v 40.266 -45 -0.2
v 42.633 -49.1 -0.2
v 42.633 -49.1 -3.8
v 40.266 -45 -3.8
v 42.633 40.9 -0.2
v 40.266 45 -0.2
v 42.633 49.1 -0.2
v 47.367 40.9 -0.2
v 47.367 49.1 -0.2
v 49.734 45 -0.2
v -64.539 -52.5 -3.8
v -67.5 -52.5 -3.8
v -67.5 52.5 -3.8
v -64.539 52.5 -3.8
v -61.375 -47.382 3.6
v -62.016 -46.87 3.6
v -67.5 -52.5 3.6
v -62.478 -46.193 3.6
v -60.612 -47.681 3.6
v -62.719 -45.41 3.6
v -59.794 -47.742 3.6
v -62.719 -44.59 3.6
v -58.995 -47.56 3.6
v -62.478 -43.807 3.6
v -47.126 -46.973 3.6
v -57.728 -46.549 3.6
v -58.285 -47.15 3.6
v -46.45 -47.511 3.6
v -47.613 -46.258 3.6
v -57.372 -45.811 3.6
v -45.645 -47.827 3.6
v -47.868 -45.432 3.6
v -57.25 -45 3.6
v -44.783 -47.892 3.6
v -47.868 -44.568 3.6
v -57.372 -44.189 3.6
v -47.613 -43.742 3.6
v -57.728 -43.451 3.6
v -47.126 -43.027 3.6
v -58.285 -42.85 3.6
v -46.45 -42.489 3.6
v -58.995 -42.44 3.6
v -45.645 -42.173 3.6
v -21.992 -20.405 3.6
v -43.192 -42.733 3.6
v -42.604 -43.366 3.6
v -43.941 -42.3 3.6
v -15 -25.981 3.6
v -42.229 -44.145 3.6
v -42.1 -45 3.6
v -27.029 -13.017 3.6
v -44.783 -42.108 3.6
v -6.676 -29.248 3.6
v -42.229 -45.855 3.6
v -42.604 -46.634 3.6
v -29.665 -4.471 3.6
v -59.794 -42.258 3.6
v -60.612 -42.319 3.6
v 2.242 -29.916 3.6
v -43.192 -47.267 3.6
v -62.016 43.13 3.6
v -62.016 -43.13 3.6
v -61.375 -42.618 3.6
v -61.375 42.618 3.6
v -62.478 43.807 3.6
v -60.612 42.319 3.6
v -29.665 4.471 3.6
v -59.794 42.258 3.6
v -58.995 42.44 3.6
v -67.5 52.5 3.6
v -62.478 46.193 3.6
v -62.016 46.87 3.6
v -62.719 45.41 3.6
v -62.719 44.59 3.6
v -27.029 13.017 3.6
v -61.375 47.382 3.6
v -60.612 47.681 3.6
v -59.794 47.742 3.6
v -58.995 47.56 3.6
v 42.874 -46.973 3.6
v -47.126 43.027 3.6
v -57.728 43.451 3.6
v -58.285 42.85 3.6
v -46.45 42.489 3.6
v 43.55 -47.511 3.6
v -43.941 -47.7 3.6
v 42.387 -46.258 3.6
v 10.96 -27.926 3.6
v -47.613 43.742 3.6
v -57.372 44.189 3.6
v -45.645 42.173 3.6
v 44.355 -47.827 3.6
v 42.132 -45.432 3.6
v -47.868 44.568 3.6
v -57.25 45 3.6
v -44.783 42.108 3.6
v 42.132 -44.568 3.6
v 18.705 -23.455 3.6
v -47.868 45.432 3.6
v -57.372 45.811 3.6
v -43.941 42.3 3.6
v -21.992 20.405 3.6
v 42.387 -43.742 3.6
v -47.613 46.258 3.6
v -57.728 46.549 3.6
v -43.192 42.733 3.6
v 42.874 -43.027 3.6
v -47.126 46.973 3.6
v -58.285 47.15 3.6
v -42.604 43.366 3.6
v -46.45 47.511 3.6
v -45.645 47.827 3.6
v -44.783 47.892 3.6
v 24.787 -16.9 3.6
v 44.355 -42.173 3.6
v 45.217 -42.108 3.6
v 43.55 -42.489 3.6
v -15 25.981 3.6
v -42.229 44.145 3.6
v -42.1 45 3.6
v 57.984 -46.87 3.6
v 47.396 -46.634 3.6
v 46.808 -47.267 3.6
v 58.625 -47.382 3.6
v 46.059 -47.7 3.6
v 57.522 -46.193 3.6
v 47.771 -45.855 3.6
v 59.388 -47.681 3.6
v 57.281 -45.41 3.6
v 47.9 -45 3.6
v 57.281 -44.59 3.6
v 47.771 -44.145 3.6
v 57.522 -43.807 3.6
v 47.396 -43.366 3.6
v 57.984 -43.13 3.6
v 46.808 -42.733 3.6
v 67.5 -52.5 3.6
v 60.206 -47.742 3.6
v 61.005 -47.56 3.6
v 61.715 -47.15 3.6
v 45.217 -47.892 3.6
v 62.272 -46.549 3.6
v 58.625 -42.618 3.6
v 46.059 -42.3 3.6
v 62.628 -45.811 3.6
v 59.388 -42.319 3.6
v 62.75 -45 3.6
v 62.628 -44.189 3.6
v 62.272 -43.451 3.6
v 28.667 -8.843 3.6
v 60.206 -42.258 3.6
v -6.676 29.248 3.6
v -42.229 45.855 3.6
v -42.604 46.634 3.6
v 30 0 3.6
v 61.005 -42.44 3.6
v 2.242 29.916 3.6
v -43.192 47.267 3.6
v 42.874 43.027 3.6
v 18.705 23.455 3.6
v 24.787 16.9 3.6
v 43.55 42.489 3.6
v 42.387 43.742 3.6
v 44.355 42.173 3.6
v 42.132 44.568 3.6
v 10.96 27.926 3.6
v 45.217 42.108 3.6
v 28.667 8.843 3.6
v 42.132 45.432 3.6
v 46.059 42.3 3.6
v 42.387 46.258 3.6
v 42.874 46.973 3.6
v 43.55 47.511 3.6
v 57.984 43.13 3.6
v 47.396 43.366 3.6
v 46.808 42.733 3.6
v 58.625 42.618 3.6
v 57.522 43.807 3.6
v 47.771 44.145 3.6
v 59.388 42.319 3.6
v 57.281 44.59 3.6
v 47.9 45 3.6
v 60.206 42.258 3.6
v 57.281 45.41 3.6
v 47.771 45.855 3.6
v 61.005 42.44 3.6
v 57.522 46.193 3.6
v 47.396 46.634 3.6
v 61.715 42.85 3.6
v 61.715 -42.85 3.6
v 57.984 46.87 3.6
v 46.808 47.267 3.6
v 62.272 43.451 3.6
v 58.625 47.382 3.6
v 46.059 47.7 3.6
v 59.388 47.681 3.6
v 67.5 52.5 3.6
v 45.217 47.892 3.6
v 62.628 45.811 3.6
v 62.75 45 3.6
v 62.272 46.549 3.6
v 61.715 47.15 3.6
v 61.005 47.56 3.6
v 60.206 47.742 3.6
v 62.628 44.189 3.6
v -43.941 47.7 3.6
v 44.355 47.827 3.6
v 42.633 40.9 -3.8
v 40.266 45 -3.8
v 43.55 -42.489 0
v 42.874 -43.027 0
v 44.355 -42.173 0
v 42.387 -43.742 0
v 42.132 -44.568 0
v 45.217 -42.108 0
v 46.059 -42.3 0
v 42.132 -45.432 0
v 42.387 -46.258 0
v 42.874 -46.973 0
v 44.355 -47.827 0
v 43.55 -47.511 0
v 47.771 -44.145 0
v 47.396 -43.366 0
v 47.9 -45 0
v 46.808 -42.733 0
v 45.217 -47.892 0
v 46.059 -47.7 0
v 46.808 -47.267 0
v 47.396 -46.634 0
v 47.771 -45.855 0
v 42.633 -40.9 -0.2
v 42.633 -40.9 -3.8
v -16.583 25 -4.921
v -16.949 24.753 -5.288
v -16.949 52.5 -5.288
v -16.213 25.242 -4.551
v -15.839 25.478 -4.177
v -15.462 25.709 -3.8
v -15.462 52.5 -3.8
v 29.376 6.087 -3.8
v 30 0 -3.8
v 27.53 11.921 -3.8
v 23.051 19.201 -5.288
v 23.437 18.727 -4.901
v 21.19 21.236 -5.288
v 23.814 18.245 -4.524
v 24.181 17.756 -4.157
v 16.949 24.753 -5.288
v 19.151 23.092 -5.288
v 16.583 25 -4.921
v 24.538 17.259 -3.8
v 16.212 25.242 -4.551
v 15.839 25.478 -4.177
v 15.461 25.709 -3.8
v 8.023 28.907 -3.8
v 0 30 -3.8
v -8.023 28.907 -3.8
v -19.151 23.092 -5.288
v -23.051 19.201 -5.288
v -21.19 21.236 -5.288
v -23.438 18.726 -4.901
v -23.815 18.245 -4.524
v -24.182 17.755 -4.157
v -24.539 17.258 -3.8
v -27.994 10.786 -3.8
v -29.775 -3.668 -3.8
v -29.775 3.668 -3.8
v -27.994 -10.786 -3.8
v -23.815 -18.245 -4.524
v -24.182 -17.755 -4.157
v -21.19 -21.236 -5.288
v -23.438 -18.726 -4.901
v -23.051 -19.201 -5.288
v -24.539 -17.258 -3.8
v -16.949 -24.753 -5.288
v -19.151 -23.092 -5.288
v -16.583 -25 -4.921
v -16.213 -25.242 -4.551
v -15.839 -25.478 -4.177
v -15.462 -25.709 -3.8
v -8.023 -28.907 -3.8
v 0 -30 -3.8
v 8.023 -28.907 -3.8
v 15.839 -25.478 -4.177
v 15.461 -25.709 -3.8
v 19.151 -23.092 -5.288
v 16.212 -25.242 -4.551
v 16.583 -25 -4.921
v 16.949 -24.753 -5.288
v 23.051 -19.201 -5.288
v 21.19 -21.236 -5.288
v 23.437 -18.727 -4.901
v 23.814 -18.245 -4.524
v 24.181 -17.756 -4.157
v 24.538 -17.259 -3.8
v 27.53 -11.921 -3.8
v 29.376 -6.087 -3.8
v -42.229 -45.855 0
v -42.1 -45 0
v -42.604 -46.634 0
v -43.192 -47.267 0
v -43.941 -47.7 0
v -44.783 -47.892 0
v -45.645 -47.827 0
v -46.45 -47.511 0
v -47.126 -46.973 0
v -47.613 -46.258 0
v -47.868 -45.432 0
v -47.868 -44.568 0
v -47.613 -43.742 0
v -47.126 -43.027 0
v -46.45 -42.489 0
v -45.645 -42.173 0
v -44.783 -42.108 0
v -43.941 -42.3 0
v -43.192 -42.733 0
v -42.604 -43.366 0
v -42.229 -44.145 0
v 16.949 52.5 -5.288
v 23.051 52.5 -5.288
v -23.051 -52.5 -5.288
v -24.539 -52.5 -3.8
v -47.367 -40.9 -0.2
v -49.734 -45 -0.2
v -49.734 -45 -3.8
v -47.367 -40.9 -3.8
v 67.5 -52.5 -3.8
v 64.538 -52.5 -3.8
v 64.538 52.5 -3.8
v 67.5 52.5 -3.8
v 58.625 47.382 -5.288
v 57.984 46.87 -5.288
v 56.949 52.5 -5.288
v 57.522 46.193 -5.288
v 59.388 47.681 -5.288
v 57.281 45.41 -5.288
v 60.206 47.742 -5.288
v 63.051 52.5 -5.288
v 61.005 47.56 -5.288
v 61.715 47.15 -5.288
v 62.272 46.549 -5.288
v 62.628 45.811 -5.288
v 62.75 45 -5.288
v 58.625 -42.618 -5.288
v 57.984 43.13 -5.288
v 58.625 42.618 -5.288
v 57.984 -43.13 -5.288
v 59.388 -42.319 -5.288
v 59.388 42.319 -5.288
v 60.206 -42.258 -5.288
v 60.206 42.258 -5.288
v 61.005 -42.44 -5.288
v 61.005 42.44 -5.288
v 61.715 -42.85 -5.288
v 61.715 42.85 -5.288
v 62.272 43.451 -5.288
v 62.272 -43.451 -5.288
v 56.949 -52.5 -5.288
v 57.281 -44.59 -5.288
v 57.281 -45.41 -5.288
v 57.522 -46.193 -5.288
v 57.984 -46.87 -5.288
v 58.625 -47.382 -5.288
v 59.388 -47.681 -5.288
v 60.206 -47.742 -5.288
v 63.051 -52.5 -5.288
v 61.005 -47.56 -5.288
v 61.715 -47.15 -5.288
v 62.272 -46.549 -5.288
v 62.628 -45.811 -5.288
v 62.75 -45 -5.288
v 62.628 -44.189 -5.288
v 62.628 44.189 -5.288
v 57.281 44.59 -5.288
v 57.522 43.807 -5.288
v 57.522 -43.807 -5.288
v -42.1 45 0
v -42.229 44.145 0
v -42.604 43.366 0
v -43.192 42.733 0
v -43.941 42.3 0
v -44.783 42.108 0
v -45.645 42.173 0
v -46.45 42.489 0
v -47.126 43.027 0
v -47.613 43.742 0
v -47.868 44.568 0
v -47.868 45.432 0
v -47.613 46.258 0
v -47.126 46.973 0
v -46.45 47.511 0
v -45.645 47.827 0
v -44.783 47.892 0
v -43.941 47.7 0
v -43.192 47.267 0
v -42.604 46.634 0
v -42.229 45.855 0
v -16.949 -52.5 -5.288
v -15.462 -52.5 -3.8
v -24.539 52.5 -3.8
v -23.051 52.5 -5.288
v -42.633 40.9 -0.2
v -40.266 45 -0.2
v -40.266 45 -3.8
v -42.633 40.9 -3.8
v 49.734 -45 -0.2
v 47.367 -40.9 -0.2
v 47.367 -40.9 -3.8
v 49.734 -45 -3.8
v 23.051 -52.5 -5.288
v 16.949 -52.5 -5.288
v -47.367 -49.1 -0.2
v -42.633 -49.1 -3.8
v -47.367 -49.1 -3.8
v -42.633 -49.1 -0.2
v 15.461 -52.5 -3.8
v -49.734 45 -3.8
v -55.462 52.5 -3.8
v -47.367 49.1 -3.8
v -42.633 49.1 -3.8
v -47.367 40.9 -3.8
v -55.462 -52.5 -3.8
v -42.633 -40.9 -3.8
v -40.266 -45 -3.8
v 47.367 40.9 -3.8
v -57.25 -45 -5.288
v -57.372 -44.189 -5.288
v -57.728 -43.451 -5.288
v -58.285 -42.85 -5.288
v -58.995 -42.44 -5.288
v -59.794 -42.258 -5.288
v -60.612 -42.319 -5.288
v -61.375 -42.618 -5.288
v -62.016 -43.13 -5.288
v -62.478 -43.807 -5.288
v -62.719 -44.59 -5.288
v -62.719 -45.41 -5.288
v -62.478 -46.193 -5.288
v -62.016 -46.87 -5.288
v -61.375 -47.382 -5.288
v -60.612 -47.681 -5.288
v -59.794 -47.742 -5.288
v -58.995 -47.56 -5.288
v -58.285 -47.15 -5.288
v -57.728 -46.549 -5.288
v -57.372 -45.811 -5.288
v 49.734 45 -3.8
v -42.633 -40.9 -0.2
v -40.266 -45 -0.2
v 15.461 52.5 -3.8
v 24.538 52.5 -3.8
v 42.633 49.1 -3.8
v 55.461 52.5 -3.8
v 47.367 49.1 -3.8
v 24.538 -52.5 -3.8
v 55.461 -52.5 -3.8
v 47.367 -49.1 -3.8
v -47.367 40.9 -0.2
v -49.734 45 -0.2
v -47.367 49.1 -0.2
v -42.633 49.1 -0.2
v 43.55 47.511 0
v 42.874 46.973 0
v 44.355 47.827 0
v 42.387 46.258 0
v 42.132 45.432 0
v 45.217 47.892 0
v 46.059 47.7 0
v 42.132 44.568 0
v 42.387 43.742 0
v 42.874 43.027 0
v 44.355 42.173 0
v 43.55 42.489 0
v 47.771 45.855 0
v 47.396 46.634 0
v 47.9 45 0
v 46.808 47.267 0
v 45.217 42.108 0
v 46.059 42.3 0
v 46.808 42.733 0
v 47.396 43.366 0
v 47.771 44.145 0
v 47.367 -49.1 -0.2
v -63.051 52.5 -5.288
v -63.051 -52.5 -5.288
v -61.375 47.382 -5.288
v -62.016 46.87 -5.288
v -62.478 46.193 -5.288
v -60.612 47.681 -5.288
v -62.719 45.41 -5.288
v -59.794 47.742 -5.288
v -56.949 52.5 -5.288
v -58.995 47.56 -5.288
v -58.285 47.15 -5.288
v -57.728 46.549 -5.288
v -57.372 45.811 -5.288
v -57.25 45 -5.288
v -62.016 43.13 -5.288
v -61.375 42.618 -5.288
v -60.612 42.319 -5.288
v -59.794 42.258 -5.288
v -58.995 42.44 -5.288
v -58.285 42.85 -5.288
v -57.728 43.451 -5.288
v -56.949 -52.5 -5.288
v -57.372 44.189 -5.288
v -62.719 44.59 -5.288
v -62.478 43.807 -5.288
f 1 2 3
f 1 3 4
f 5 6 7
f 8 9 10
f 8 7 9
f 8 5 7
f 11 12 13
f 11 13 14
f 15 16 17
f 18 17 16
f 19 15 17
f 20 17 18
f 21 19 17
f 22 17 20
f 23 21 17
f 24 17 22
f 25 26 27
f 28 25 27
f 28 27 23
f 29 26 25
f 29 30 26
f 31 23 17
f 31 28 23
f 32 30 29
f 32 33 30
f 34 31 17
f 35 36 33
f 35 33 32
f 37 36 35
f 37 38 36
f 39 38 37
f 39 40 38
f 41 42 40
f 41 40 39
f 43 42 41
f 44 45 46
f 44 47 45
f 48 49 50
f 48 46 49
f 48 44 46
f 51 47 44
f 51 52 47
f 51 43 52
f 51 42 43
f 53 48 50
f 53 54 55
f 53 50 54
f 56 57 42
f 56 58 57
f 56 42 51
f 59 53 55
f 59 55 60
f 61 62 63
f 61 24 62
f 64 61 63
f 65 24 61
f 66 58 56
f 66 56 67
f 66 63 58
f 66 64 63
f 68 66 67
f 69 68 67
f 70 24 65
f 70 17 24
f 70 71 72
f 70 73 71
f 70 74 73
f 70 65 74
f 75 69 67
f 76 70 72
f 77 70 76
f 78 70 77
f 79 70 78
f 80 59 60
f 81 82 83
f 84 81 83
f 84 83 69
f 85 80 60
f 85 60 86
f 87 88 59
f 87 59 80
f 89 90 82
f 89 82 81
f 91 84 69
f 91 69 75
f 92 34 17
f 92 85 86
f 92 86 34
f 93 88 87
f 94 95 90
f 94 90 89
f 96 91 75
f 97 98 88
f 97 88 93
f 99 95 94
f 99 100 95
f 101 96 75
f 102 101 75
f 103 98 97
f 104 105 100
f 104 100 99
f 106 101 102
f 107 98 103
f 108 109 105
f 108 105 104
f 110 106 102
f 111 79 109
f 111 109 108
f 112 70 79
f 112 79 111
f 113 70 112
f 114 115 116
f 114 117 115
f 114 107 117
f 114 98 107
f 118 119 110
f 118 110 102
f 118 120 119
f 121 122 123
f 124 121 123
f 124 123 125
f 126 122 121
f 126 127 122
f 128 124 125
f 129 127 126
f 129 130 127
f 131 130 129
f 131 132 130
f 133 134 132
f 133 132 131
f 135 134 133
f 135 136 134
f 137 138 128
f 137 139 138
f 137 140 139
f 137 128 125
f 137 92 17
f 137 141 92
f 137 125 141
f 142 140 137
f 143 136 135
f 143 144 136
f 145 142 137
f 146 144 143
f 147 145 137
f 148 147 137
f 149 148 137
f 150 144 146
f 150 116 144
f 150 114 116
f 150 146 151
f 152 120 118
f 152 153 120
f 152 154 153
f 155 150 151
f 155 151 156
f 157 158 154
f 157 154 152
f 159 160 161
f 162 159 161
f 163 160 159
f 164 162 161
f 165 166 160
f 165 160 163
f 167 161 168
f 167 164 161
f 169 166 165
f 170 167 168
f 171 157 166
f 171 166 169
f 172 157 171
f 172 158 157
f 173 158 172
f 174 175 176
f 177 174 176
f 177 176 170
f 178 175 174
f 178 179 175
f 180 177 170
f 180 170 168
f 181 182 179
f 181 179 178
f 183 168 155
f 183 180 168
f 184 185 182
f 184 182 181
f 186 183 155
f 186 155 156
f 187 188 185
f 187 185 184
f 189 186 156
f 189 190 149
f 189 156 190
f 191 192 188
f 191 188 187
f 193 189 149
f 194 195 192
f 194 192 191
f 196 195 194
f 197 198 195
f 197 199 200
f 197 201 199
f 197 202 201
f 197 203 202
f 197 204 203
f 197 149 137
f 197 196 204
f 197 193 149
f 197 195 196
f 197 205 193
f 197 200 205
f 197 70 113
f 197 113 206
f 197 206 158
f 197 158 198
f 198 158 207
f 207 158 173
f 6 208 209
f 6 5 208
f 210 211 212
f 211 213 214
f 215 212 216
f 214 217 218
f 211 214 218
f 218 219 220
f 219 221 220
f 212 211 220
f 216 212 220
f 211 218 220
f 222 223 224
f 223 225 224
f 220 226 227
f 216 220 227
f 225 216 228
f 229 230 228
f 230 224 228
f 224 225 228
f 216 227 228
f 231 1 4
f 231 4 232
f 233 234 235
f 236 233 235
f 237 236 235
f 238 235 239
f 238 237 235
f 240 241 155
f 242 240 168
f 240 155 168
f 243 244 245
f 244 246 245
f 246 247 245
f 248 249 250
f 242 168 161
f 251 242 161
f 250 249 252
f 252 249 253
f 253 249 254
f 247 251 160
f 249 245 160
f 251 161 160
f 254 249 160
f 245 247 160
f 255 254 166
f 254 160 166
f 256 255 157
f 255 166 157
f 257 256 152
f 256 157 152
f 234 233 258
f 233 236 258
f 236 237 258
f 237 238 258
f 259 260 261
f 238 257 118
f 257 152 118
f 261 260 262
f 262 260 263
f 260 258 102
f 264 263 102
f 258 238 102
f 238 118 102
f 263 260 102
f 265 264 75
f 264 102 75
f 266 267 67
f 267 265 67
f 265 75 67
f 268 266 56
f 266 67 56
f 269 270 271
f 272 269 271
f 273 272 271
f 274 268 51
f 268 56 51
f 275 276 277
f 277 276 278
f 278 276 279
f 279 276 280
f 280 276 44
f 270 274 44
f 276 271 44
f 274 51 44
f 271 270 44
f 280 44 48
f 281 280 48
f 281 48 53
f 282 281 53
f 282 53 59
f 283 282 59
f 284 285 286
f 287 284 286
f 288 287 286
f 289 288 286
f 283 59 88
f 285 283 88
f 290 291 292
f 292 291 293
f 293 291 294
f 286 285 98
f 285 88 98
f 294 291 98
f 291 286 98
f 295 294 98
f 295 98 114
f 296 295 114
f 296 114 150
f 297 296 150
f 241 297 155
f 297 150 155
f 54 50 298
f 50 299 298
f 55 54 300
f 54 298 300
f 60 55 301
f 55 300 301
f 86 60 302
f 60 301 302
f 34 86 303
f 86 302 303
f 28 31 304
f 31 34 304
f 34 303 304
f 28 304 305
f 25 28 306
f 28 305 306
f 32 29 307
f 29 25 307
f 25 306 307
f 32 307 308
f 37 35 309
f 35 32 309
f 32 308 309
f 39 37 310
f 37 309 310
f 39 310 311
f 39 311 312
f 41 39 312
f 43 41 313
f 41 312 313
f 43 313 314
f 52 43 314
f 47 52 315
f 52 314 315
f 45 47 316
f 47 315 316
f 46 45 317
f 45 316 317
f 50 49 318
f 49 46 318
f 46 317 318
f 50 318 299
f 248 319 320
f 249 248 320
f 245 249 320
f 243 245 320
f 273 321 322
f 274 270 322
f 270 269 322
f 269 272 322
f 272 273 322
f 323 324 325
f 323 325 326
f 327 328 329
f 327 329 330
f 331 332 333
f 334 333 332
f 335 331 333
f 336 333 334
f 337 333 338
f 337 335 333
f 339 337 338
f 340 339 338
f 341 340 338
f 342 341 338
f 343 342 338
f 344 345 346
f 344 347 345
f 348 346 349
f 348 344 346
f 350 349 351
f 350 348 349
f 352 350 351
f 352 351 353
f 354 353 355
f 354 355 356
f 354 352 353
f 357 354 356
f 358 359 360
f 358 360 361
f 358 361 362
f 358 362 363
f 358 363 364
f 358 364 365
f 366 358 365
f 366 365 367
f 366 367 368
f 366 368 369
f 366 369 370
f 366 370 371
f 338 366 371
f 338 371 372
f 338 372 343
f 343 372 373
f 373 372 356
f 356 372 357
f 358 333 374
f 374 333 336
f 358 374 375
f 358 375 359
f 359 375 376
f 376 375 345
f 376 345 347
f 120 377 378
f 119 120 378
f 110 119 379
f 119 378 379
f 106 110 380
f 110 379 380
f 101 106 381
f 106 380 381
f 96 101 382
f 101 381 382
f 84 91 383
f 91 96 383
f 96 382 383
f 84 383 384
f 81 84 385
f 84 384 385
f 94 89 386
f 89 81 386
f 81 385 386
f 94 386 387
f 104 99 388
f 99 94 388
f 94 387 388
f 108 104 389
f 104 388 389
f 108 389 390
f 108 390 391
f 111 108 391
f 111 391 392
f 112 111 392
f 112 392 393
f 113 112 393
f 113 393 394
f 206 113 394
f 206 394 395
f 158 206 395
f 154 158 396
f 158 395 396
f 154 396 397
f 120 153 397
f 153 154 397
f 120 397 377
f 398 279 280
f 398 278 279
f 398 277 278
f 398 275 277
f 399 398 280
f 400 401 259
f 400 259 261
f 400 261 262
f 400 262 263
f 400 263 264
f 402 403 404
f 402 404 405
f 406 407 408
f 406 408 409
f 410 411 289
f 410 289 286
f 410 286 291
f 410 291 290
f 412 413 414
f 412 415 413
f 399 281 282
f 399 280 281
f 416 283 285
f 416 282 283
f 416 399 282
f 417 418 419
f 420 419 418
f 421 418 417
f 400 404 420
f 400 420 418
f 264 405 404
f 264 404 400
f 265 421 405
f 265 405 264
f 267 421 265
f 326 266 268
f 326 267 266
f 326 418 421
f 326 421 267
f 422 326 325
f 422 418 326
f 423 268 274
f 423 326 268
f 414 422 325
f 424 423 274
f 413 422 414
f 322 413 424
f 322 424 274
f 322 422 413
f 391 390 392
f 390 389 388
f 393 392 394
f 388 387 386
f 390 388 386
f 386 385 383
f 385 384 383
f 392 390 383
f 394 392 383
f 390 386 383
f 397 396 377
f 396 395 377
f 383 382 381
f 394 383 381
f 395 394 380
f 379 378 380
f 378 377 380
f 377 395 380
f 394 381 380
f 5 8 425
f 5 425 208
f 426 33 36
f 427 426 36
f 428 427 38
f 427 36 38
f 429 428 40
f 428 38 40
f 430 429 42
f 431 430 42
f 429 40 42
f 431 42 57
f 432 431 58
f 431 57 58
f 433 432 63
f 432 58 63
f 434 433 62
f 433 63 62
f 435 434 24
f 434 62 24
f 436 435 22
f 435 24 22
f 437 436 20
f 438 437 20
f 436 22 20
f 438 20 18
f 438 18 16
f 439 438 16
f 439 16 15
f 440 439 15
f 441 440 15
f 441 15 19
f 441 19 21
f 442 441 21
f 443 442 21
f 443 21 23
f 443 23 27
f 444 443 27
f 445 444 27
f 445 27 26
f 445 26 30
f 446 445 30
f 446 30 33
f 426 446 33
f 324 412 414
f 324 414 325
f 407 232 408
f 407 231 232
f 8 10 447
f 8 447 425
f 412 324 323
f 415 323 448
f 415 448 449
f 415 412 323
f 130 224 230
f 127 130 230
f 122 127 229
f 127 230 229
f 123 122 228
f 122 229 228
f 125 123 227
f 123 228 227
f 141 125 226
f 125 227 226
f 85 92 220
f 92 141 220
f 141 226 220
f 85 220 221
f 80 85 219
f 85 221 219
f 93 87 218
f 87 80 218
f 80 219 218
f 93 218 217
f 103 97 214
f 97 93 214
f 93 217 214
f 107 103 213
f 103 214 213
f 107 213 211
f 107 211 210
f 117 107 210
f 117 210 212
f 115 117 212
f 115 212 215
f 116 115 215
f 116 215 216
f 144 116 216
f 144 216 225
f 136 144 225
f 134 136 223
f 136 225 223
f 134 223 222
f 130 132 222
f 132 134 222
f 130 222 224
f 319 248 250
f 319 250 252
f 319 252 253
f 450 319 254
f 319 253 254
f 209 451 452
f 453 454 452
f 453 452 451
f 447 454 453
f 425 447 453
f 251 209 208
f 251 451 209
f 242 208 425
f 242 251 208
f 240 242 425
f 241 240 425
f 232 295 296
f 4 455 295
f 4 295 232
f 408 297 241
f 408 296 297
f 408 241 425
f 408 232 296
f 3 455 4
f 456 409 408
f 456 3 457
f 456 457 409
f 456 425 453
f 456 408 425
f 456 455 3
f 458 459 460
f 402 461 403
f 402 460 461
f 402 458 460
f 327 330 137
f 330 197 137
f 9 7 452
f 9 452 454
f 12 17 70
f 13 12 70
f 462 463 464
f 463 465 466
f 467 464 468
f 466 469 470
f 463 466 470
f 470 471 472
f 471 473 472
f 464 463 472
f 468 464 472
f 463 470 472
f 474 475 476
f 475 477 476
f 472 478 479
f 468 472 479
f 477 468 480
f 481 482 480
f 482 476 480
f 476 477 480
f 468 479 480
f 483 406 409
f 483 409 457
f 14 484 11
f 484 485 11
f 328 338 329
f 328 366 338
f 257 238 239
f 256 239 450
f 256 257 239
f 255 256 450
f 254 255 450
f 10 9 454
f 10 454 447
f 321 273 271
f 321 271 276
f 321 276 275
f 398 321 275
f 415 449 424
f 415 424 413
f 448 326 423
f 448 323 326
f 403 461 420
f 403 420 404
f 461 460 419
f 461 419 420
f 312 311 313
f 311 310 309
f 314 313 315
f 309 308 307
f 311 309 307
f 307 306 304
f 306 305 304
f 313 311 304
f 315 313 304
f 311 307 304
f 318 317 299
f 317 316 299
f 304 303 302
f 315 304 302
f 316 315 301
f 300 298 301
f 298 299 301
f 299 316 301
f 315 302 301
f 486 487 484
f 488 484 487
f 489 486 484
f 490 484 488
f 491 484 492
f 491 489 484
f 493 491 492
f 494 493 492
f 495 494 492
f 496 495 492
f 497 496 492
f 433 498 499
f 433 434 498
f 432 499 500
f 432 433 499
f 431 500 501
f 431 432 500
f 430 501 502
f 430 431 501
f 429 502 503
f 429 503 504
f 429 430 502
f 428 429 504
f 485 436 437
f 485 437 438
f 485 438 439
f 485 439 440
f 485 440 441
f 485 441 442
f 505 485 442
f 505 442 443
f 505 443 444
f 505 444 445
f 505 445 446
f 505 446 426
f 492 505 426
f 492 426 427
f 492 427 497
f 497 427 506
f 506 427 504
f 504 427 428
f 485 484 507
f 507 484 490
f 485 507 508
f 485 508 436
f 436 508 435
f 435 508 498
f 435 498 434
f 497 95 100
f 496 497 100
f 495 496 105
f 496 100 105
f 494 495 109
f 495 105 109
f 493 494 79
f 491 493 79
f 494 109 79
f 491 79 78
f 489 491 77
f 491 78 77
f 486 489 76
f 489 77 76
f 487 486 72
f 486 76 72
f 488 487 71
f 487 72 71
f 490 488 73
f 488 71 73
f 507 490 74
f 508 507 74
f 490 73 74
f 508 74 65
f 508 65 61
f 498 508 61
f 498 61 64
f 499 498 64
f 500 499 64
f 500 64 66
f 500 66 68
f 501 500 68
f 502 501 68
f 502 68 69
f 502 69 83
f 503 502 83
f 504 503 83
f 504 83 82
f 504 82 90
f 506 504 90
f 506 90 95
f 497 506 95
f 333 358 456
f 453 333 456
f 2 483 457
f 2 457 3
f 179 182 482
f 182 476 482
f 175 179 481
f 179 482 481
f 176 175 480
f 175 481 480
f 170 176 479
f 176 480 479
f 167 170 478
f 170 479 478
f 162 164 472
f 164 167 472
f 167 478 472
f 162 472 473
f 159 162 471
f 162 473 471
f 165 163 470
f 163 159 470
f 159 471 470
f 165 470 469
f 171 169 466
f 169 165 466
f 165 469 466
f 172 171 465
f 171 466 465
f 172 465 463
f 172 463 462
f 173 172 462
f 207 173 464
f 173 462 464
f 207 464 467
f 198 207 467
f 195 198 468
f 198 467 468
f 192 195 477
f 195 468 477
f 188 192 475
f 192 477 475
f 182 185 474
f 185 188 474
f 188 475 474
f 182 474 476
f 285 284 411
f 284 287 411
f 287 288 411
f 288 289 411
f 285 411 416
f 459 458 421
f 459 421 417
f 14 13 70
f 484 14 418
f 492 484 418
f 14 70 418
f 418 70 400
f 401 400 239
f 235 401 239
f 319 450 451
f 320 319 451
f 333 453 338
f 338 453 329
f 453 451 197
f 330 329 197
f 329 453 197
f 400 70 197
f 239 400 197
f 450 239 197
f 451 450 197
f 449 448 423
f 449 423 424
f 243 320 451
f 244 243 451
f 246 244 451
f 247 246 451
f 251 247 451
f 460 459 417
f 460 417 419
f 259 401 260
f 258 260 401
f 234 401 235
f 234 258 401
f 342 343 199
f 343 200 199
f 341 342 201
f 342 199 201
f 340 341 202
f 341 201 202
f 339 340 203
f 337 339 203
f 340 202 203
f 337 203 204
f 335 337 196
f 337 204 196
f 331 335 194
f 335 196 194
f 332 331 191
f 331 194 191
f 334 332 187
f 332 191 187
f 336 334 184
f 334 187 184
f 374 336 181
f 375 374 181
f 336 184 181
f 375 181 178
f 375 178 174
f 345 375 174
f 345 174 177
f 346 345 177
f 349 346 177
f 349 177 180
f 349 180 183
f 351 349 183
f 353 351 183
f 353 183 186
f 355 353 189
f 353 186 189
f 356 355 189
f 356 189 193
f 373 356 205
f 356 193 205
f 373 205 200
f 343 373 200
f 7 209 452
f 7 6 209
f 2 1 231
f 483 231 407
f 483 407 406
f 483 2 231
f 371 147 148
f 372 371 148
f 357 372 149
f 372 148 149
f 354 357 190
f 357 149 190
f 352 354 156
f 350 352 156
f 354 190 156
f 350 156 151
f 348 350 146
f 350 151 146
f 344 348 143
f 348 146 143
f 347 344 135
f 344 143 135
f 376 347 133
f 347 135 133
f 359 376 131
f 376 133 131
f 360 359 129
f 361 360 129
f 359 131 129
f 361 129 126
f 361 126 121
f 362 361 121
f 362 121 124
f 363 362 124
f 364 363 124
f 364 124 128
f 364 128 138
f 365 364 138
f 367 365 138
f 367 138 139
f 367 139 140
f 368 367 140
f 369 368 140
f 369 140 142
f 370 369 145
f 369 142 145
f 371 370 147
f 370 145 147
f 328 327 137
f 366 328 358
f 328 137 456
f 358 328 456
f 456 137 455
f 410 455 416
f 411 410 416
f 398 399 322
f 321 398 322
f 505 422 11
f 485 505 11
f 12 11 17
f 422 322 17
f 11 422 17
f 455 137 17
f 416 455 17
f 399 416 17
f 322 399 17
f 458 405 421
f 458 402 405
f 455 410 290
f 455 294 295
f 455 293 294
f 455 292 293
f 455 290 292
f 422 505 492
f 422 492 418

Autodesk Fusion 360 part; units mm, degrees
sketch "Sketch1" plane through (0, 0, 0) normal (0, 0, 1) x (1, 0, 0)
  line L0 (-45, 45) -> (45, 45) construction
  line L1 (45, 45) -> (45, -45) construction
  line L2 (45, -45) -> (-45, -45) construction
  line L3 (-45, -45) -> (-45, 45) construction
  line L4 (-45, 45) -> (45, -45) construction
  line L5 (45, 45) -> (-45, -45) construction
  circle A0 centre (-45, 45) radius 2.9
  circle A1 centre (45, 45) radius 2.9
  circle A2 centre (-45, -45) radius 2.9
  circle A3 centre (45, -45) radius 2.9
  line L6 (-60, 45) -> (60, 45) construction
  line L7 (60, 45) -> (60, -45) construction
  line L8 (60, -45) -> (-60, -45) construction
  line L9 (-60, -45) -> (-60, 45) construction
  line L10 (-60, 45) -> (60, -45) construction
  line L11 (60, 45) -> (-60, -45) construction
  circle A4 centre (-60, 45) radius 2.75
  circle A5 centre (60, 45) radius 2.75
  circle A6 centre (60, -45) radius 2.75
  circle A7 centre (-60, -45) radius 2.75
  line L12 (-67.5, 52.5) -> (67.5, 52.5)
  line L13 (67.5, 52.5) -> (67.5, -52.5)
  line L14 (67.5, -52.5) -> (-67.5, -52.5)
  line L15 (-67.5, -52.5) -> (-67.5, 52.5)
  line L16 (-67.5, 52.5) -> (67.5, -52.5) construction
  line L17 (67.5, 52.5) -> (-67.5, -52.5) construction
  circle A8 centre (0, 0) radius 30
  dimension "d1" = 90
  dimension "d2" = 90
  dimension "d3" = 5.8
  dimension "d4" = 5.8
  dimension "d5" = 5.8
  dimension "d6" = 5.8
  dimension "d7" = 120
  dimension "d8" = 90
  dimension "d9" = 5.5
  dimension "d10" = 5.5
  dimension "d11" = 5.5
  dimension "d12" = 5.5
  dimension "d13" = 135
  dimension "d14" = 105
  dimension "d27" = 60
extrude "Extrude1" add sketch "Sketch1" along normal blind 3.6
sketch "Sketch2" plane through (0, 0, 0) normal (0, 0, -1) x (1, 0, 0)
  circle A0 centre (-45, -45) radius 2.9
  circle A1 centre (-60, -45) radius 2.75
  circle A2 centre (60, -45) radius 2.75
  circle A3 centre (-60, 45) radius 2.75
  circle A4 centre (45, -45) radius 2.9
  circle A5 centre (-45, 45) radius 2.9
  circle A6 centre (45, 45) radius 2.9
  circle A7 centre (60, 45) radius 2.75
  line L0 (67.5, 52.5) -> (-67.5, 52.5)
  line L1 (-67.5, 52.5) -> (-67.5, -52.5)
  line L2 (-67.5, -52.5) -> (67.5, -52.5)
  line L3 (67.5, -52.5) -> (67.5, 52.5)
  line L4 (-67.5, 52.5) -> (67.5, 52.5)
  line L5 (67.5, 52.5) -> (67.5, -52.5)
  line L6 (67.5, -52.5) -> (-67.5, -52.5)
  line L7 (-67.5, -52.5) -> (-67.5, 52.5)
  line L8 (-67.5, 52.5) -> (67.5, -52.5) construction
  line L9 (67.5, 52.5) -> (-67.5, -52.5) construction
  circle A8 centre (0, 0) radius 30
  dimension "d17" = 135
  dimension "d18" = 105
extrude "Extrude2" add sketch "Sketch2" along normal blind 0.2 contours A0 | A4 | A5 | A6 | L0 L1 L2 L3 L4 L5 L6 L7
sketch "Sketch3" plane through (0, 0, -0.2) normal (0, 0, -1) x (1, 0, 0)
  circle A0 centre (-60, -45) radius 2.75
  circle A1 centre (60, -45) radius 2.75
  circle A2 centre (-60, 45) radius 2.75
  circle A3 centre (60, 45) radius 2.75
  line L0 (-67.5, -52.5) -> (67.5, -52.5)
  line L1 (67.5, -52.5) -> (67.5, 52.5)
  line L2 (67.5, 52.5) -> (-67.5, 52.5)
  line L3 (-67.5, 52.5) -> (-67.5, -52.5)
  line L4 (-42.6329, 40.9) -> (-40.2657, 45)
  line L5 (-40.2657, 45) -> (-42.6329, 49.1)
  line L6 (-42.6329, 49.1) -> (-47.3671, 49.1)
  line L7 (-47.3671, 49.1) -> (-49.7343, 45)
  line L8 (-49.7343, 45) -> (-47.3671, 40.9)
  line L9 (-47.3671, 40.9) -> (-42.6329, 40.9)
  line L10 (-47.3671, -40.9) -> (-49.7343, -45)
  line L11 (-49.7343, -45) -> (-47.3671, -49.1)
  line L12 (-47.3671, -49.1) -> (-42.6329, -49.1)
  line L13 (-42.6329, -49.1) -> (-40.2657, -45)
  line L14 (-40.2657, -45) -> (-42.6329, -40.9)
  line L15 (-42.6329, -40.9) -> (-47.3671, -40.9)
  line L16 (47.3671, 40.9) -> (49.7343, 45)
  line L17 (49.7343, 45) -> (47.3671, 49.1)
  line L18 (47.3671, 49.1) -> (42.6329, 49.1)
  line L19 (42.6329, 49.1) -> (40.2657, 45)
  line L20 (40.2657, 45) -> (42.6329, 40.9)
  line L21 (42.6329, 40.9) -> (47.3671, 40.9)
  line L22 (42.6329, -40.9) -> (40.2657, -45)
  line L23 (40.2657, -45) -> (42.6329, -49.1)
  line L24 (42.6329, -49.1) -> (47.3671, -49.1)
  line L25 (47.3671, -49.1) -> (49.7343, -45)
  line L26 (49.7343, -45) -> (47.3671, -40.9)
  line L27 (47.3671, -40.9) -> (42.6329, -40.9)
  circle A4 centre (0, 0) radius 30
  point P0 (-45, 45)
  point P1 (-45, -45)
  point P2 (45, 45)
  point P3 (45, -45)
  dimension "d21" = 4.1
  dimension "d22" = 4.1
  dimension "d23" = 4.1
  dimension "d24" = 4.1
extrude "Extrude3" add sketch "Sketch3" along normal blind 3.6
sketch "Sketch4" plane through (-67.5, 0, 0) normal (-1, 0, 0) x (0, -1, 0)
  line L0 (52.5, -3.8) -> (52.5, 3.6)
  line L1 (52.5, 3.6) -> (-52.5, 3.6)
  line L2 (-52.5, 3.6) -> (-52.5, -3.8)
  line L3 (-52.5, -3.8) -> (52.5, -3.8)
  line L4 (-3.0507, 8.6121) -> (-4.3315, 9.8929)
  line L5 (-4.8314, 10.1) -> (-3.6911, 10.1) construction
  line L6 (-4.8314, 10.1) -> (-4.5386, 10.1) construction
  line L7 (4.3315, 9.8929) -> (3.0507, 8.6121)
  line L8 (-3.0507, 8.6121) -> (3.0507, 8.6121)
  line L9 (4.8314, 10.1) -> (4.5386, 10.1) construction
  line L10 (4.3315, 9.8929) -> (4.5386, 10.1)
  line L11 (-4.3315, 9.8929) -> (-4.5386, 10.1)
  line L12 (-52.5, -0.1) -> (-45, -0.1) construction
  line L13 (52.5, -0.1) -> (45, -0.1) construction
sketch "Sketch5" plane through (0, -52.5, 0) normal (0, -1, 0) x (1, 0, 0)
  line L0 (67.5, -3.8) -> (67.5, 3.6)
  line L1 (67.5, 3.6) -> (-67.5, 3.6)
  line L2 (-67.5, 3.6) -> (-67.5, -3.8)
  line L3 (-67.5, -3.8) -> (67.5, -3.8)
  line L4 (15.1684, -3.7997) -> (16.3088, -3.7997) construction
  line L5 (15.6684, -4.0068) -> (15.4613, -3.7997)
  line L6 (15.1684, -3.7997) -> (15.4613, -3.7997) construction
  line L7 (24.8313, -3.7997) -> (24.5385, -3.7997) construction
  line L8 (16.9492, -5.2876) -> (23.0506, -5.2876)
  line L9 (24.3314, -4.0068) -> (24.5385, -3.7997)
  line L10 (24.3314, -4.0068) -> (23.0506, -5.2876)
  line L11 (16.9492, -5.2876) -> (15.6684, -4.0068)
  line L12 (-67.5, -0.1) -> (-60, -0.1) construction
  line L13 (-60, -0.1) -> (60, -0.1) construction
  line L14 (60, -0.1) -> (67.5, -0.1) construction
  line L15 (-60, -0.1) -> (-20, -0.1) construction
  line L16 (60, -0.1) -> (20, -0.1) construction
  line L17 (-20, -0.1) -> (-20, 10.5) construction
  line L18 (16.9492, -5.2876) -> (19.9999, -5.2876) construction
  line L19 (-23.0508, -5.2876) -> (-20.0001, -5.2876) construction
  line L20 (-15.6686, -4.0068) -> (-15.4615, -3.7997)
  line L21 (-24.8316, -3.7997) -> (-23.6912, -3.7997) construction
  line L22 (-23.0508, -5.2876) -> (-16.9494, -5.2876)
  line L23 (-15.6686, -4.0068) -> (-16.9494, -5.2876)
  line L24 (-23.0508, -5.2876) -> (-24.3316, -4.0068)
  line L25 (-24.8316, -3.7997) -> (-24.5387, -3.7997) construction
  line L26 (-24.3316, -4.0068) -> (-24.5387, -3.7997)
  line L27 (-15.1687, -3.7997) -> (-15.4615, -3.7997) construction
  line L28 (64.8313, -3.7997) -> (64.5385, -3.7997) construction
  line L29 (56.9492, -5.2876) -> (59.9999, -5.2876) construction
  line L30 (64.3314, -4.0068) -> (63.0506, -5.2876)
  line L31 (55.6684, -4.0068) -> (55.4613, -3.7997)
  line L32 (56.9492, -5.2876) -> (55.6684, -4.0068)
  line L33 (55.1684, -3.7997) -> (55.4613, -3.7997) construction
  line L34 (56.9492, -5.2876) -> (63.0506, -5.2876)
  line L35 (64.3314, -4.0068) -> (64.5385, -3.7997)
  line L36 (55.1684, -3.7997) -> (56.3088, -3.7997) construction
  line L37 (-63.0508, -5.2876) -> (-64.3316, -4.0068)
  line L38 (-63.0508, -5.2876) -> (-60.0001, -5.2876) construction
  line L39 (-64.3316, -4.0068) -> (-64.5387, -3.7997)
  line L40 (-55.6686, -4.0068) -> (-56.9494, -5.2876)
  line L41 (-63.0508, -5.2876) -> (-56.9494, -5.2876)
  line L42 (-55.6686, -4.0068) -> (-55.4615, -3.7997)
  line L43 (-64.8316, -3.7997) -> (-64.5387, -3.7997) construction
  line L44 (-55.1687, -3.7997) -> (-55.4615, -3.7997) construction
  line L45 (-64.8316, -3.7997) -> (-63.6912, -3.7997) construction
extrude "Extrude4" add sketch "Sketch5" against normal blind 105 contours L3 L30 L31 L32 L34 L35 | L3 L5 L8 L9 L10 L11 | L3 L37 L39 L40 L41 L42 | L3 L20 L22 L23 L24 L26
extrude "Extrude5" cut sketch "Sketch3" along normal blind 6 contours A0 | A1 | A2 | A3 | A4
